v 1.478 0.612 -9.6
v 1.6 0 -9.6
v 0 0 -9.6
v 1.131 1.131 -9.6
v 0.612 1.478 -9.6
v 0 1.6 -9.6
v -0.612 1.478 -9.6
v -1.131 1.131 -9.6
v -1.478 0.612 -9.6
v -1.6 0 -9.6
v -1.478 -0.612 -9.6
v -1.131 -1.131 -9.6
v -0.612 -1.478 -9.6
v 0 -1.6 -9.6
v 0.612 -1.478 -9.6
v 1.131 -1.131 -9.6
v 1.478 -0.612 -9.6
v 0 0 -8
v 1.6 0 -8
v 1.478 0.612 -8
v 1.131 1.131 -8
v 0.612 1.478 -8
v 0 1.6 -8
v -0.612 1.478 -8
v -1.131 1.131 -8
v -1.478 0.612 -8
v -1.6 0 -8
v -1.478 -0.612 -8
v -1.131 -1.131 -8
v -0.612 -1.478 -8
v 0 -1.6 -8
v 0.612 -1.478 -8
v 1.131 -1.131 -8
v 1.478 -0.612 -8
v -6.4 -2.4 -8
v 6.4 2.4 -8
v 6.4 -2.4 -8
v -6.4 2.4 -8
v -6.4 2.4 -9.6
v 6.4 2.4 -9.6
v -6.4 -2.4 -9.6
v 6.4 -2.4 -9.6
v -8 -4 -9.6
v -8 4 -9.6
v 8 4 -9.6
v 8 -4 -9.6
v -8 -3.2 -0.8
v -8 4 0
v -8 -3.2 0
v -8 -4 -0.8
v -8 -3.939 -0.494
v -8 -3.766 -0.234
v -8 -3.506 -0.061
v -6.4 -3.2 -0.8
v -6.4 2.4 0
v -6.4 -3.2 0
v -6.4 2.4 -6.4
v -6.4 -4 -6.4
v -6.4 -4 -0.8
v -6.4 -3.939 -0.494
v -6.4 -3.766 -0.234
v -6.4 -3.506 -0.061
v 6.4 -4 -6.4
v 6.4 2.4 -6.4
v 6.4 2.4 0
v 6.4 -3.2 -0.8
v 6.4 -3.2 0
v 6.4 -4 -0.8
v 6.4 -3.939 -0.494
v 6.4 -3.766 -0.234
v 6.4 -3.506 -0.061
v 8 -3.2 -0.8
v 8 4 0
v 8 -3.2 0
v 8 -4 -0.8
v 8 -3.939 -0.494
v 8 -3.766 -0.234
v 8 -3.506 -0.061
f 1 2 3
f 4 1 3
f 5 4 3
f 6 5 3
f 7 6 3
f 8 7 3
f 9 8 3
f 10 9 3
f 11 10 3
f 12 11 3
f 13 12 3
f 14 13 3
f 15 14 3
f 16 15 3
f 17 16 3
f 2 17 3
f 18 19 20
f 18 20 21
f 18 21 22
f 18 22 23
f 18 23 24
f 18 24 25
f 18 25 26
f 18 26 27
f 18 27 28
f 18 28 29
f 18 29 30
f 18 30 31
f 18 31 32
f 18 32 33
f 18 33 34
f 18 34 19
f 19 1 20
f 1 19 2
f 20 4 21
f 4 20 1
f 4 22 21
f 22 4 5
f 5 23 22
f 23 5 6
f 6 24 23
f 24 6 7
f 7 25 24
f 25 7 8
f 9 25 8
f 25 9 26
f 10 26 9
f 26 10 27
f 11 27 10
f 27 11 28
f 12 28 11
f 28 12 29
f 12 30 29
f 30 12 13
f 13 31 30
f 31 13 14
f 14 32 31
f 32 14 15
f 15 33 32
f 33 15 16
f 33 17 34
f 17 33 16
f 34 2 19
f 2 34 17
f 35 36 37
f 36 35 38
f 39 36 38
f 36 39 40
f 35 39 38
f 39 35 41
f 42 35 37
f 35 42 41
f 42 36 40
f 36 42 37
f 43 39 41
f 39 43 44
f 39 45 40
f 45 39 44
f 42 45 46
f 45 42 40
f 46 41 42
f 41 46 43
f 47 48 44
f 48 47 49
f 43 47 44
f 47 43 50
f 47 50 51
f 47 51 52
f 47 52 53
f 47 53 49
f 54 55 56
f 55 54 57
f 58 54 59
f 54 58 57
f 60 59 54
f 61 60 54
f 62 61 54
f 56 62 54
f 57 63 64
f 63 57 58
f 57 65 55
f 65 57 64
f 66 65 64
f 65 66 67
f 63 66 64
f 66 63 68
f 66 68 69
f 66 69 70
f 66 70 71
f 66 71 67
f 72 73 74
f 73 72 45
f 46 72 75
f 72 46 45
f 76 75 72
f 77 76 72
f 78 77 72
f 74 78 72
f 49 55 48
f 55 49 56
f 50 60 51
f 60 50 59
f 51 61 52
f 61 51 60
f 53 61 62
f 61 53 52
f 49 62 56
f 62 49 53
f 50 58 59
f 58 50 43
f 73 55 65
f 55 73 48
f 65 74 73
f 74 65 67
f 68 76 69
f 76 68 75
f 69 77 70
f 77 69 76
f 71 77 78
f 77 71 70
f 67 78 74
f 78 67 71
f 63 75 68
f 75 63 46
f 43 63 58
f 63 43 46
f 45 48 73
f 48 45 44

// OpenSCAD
// file: ../p/4-4edge.scad
use <../lib.scad>
function ldraw_lib__4_4edge() = [
// 0 Circle 1.0
// 0 Name: 4-4edge.dat
// 0 Author: James Jessiman
// 0 !LDRAW_ORG Primitive UPDATE 2017-01
// 0 !LICENSE Licensed under CC BY 2.0 and CC BY 4.0 : see CAreadme.txt
// 
// 0 BFC CERTIFY CCW
  [0,"BFC","CERTIFY"],
  [0,"BFC","CCW"],
// 
// 0 !HISTORY 1998-12-15 [PTadmin] Official Update 1998-10
// 0 !HISTORY 2005-12-28 [PTadmin] Official Update 2005-01
// 0 !HISTORY 2007-06-24 [PTadmin] Header formatted for Contributor Agreement
// 0 !HISTORY 2008-07-01 [PTadmin] Official Update 2008-01
// 0 !HISTORY 2017-01-15 [Steffen] BFCed
// 0 !HISTORY 2017-12-30 [PTadmin] Official Update 2017-01
// 
// 
// 2 24 1 0 0 0.9239 0 0.3827
  [2,24,1,0,0,0.9239,0,0.3827],
// 2 24 0.9239 0 0.3827 0.7071 0 0.7071
  [2,24,0.9239,0,0.3827,0.7071,0,0.7071],
// 2 24 0.7071 0 0.7071 0.3827 0 0.9239
  [2,24,0.7071,0,0.7071,0.3827,0,0.9239],
// 2 24 0.3827 0 0.9239 0 0 1
  [2,24,0.3827,0,0.9239,0,0,1],
// 2 24 0 0 1 -0.3827 0 0.9239
  [2,24,0,0,1,-0.3827,0,0.9239],
// 2 24 -0.3827 0 0.9239 -0.7071 0 0.7071
  [2,24,-0.3827,0,0.9239,-0.7071,0,0.7071],
// 2 24 -0.7071 0 0.7071 -0.9239 0 0.3827
  [2,24,-0.7071,0,0.7071,-0.9239,0,0.3827],
// 2 24 -0.9239 0 0.3827 -1 0 -0
  [2,24,-0.9239,0,0.3827,-1,0,-0],
// 2 24 -1 0 -0 -0.9239 0 -0.3827
  [2,24,-1,0,-0,-0.9239,0,-0.3827],
// 2 24 -0.9239 0 -0.3827 -0.7071 0 -0.7071
  [2,24,-0.9239,0,-0.3827,-0.7071,0,-0.7071],
// 2 24 -0.7071 0 -0.7071 -0.3827 0 -0.9239
  [2,24,-0.7071,0,-0.7071,-0.3827,0,-0.9239],
// 2 24 -0.3827 0 -0.9239 0 0 -1
  [2,24,-0.3827,0,-0.9239,0,0,-1],
// 2 24 0 0 -1 0.3827 0 -0.9239
  [2,24,0,0,-1,0.3827,0,-0.9239],
// 2 24 0.3827 0 -0.9239 0.7071 0 -0.7071
  [2,24,0.3827,0,-0.9239,0.7071,0,-0.7071],
// 2 24 0.7071 0 -0.7071 0.9239 0 -0.3827
  [2,24,0.7071,0,-0.7071,0.9239,0,-0.3827],
// 2 24 0.9239 0 -0.3827 1 0 0
  [2,24,0.9239,0,-0.3827,1,0,0],
];
module ldraw_lib__4_4edge(step=0, col=false, unit=2/5, alt=false, line=0.2, solid=!$preview)
    makepoly(ldraw_lib__4_4edge(), step=step, col=col, unit=unit, alt=alt, line=line, solid=solid);
ldraw_lib__4_4edge(line=0.2);
// file: ../p/4-4disc.scad
use <../lib.scad>
function ldraw_lib__4_4disc() = [
// 0 Disc 1.0
// 0 Name: 4-4disc.dat
// 0 Author: James Jessiman
// 0 !LDRAW_ORG Primitive UPDATE 2002-02
// 0 !LICENSE Licensed under CC BY 2.0 and CC BY 4.0 : see CAreadme.txt
// 
// 0 BFC CERTIFY CCW
  [0,"BFC","CERTIFY"],
  [0,"BFC","CCW"],
// 
// 0 !HISTORY 1998-12-15 [PTadmin] Official Update 1998-10
// 0 !HISTORY 2002-03-23 [sbliss] Added BFC statement
// 0 !HISTORY 2002-04-25 [PTadmin] Official Update 2002-02
// 0 !HISTORY 2007-06-24 [PTadmin] Header formatted for Contributor Agreement
// 0 !HISTORY 2008-07-01 [PTadmin] Official Update 2008-01
// 
// 
// 3 16 0 0 0 1 0 0 0.9239 0 0.3827
  [3,16,0,0,0,1,0,0,0.9239,0,0.3827],
// 3 16 0 0 0 0.9239 0 0.3827 0.7071 0 0.7071
  [3,16,0,0,0,0.9239,0,0.3827,0.7071,0,0.7071],
// 3 16 0 0 0 0.7071 0 0.7071 0.3827 0 0.9239
  [3,16,0,0,0,0.7071,0,0.7071,0.3827,0,0.9239],
// 3 16 0 0 0 0.3827 0 0.9239 0 0 1
  [3,16,0,0,0,0.3827,0,0.9239,0,0,1],
// 3 16 0 0 0 0 0 1 -0.3827 0 0.9239
  [3,16,0,0,0,0,0,1,-0.3827,0,0.9239],
// 3 16 0 0 0 -0.3827 0 0.9239 -0.7071 0 0.7071
  [3,16,0,0,0,-0.3827,0,0.9239,-0.7071,0,0.7071],
// 3 16 0 0 0 -0.7071 0 0.7071 -0.9239 0 0.3827
  [3,16,0,0,0,-0.7071,0,0.7071,-0.9239,0,0.3827],
// 3 16 0 0 0 -0.9239 0 0.3827 -1 0 -0
  [3,16,0,0,0,-0.9239,0,0.3827,-1,0,-0],
// 3 16 0 0 0 -1 0 -0 -0.9239 0 -0.3827
  [3,16,0,0,0,-1,0,-0,-0.9239,0,-0.3827],
// 3 16 0 0 0 -0.9239 0 -0.3827 -0.7071 0 -0.7071
  [3,16,0,0,0,-0.9239,0,-0.3827,-0.7071,0,-0.7071],
// 3 16 0 0 0 -0.7071 0 -0.7071 -0.3827 0 -0.9239
  [3,16,0,0,0,-0.7071,0,-0.7071,-0.3827,0,-0.9239],
// 3 16 0 0 0 -0.3827 0 -0.9239 0 0 -1
  [3,16,0,0,0,-0.3827,0,-0.9239,0,0,-1],
// 3 16 0 0 0 0 0 -1 0.3827 0 -0.9239
  [3,16,0,0,0,0,0,-1,0.3827,0,-0.9239],
// 3 16 0 0 0 0.3827 0 -0.9239 0.7071 0 -0.7071
  [3,16,0,0,0,0.3827,0,-0.9239,0.7071,0,-0.7071],
// 3 16 0 0 0 0.7071 0 -0.7071 0.9239 0 -0.3827
  [3,16,0,0,0,0.7071,0,-0.7071,0.9239,0,-0.3827],
// 3 16 0 0 0 0.9239 0 -0.3827 1 0 0
  [3,16,0,0,0,0.9239,0,-0.3827,1,0,0],
// 0
];
module ldraw_lib__4_4disc(step=0, col=false, unit=2/5, alt=false, line=0.2, solid=!$preview)
    makepoly(ldraw_lib__4_4disc(), step=step, col=col, unit=unit, alt=alt, line=line, solid=solid);
ldraw_lib__4_4disc(line=0.2);
// file: ../p/4-4cyli.scad
use <../lib.scad>
function ldraw_lib__4_4cyli() = [
// 0 Cylinder 1.0
// 0 Name: 4-4cyli.dat
// 0 Author: James Jessiman
// 0 !LDRAW_ORG Primitive UPDATE 2005-01
// 0 !LICENSE Licensed under CC BY 4.0 : see CAreadme.txt
// 
// 0 BFC CERTIFY CCW
  [0,"BFC","CERTIFY"],
  [0,"BFC","CCW"],
// 
// 0 !HISTORY 1998-12-15 [PTadmin] Official Update 1998-10
// 0 !HISTORY 2002-03-23 [sbliss] Added BFC statement; merged headers from files in distributions LDraw 0.27 and Complete.
// 0 !HISTORY 2002-04-25 [PTadmin] Official Update 2002-02
// 0 !HISTORY 2004-12-14 [guyvivan] BFC CCW
// 0 !HISTORY 2005-12-28 [PTadmin] Official Update 2005-01
// 0 !HISTORY 2007-06-24 [PTadmin] Header formatted for Contributor Agreement
// 0 !HISTORY 2008-07-01 [PTadmin] Official Update 2008-01
// 
// 
// 4 16 1 1 0 0.9239 1 0.3827 0.9239 0 0.3827 1 0 0
  [4,16,1,1,0,0.9239,1,0.3827,0.9239,0,0.3827,1,0,0],
// 5 24 1 0 0 1 1 0 0.9239 0 0.3827 0.9239 0 -0.3827
  [5,24,1,0,0,1,1,0,0.9239,0,0.3827,0.9239,0,-0.3827],
// 4 16 0.9239 1 0.3827 0.7071 1 0.7071 0.7071 0 0.7071 0.9239 0 0.3827
  [4,16,0.9239,1,0.3827,0.7071,1,0.7071,0.7071,0,0.7071,0.9239,0,0.3827],
// 5 24 0.9239 0 0.3827 0.9239 1 0.3827 0.7071 0 0.7071 1 0 0
  [5,24,0.9239,0,0.3827,0.9239,1,0.3827,0.7071,0,0.7071,1,0,0],
// 4 16 0.7071 1 0.7071 0.3827 1 0.9239 0.3827 0 0.9239 0.7071 0 0.7071
  [4,16,0.7071,1,0.7071,0.3827,1,0.9239,0.3827,0,0.9239,0.7071,0,0.7071],
// 5 24 0.7071 0 0.7071 0.7071 1 0.7071 0.3827 0 0.9239 0.9239 0 0.3827
  [5,24,0.7071,0,0.7071,0.7071,1,0.7071,0.3827,0,0.9239,0.9239,0,0.3827],
// 4 16 0.3827 1 0.9239 0 1 1 0 0 1 0.3827 0 0.9239
  [4,16,0.3827,1,0.9239,0,1,1,0,0,1,0.3827,0,0.9239],
// 5 24 0.3827 0 0.9239 0.3827 1 0.9239 0 0 1 0.7071 0 0.7071
  [5,24,0.3827,0,0.9239,0.3827,1,0.9239,0,0,1,0.7071,0,0.7071],
// 4 16 0 1 1 -0.3827 1 0.9239 -0.3827 0 0.9239 0 0 1
  [4,16,0,1,1,-0.3827,1,0.9239,-0.3827,0,0.9239,0,0,1],
// 5 24 0 0 1 0 1 1 -0.3827 0 0.9239 0.3827 0 0.9239
  [5,24,0,0,1,0,1,1,-0.3827,0,0.9239,0.3827,0,0.9239],
// 4 16 -0.3827 1 0.9239 -0.7071 1 0.7071 -0.7071 0 0.7071 -0.3827 0 0.9239
  [4,16,-0.3827,1,0.9239,-0.7071,1,0.7071,-0.7071,0,0.7071,-0.3827,0,0.9239],
// 5 24 -0.3827 0 0.9239 -0.3827 1 0.9239 -0.7071 0 0.7071 0 0 1
  [5,24,-0.3827,0,0.9239,-0.3827,1,0.9239,-0.7071,0,0.7071,0,0,1],
// 4 16 -0.7071 1 0.7071 -0.9239 1 0.3827 -0.9239 0 0.3827 -0.7071 0 0.7071
  [4,16,-0.7071,1,0.7071,-0.9239,1,0.3827,-0.9239,0,0.3827,-0.7071,0,0.7071],
// 5 24 -0.7071 0 0.7071 -0.7071 1 0.7071 -0.9239 0 0.3827 -0.3827 0 0.9239
  [5,24,-0.7071,0,0.7071,-0.7071,1,0.7071,-0.9239,0,0.3827,-0.3827,0,0.9239],
// 4 16 -0.9239 1 0.3827 -1 1 0 -1 0 0 -0.9239 0 0.3827
  [4,16,-0.9239,1,0.3827,-1,1,0,-1,0,0,-0.9239,0,0.3827],
// 5 24 -0.9239 0 0.3827 -0.9239 1 0.3827 -1 0 0 -0.7071 0 0.7071
  [5,24,-0.9239,0,0.3827,-0.9239,1,0.3827,-1,0,0,-0.7071,0,0.7071],
// 4 16 -1 1 0 -0.9239 1 -0.3827 -0.9239 0 -0.3827 -1 0 0
  [4,16,-1,1,0,-0.9239,1,-0.3827,-0.9239,0,-0.3827,-1,0,0],
// 5 24 -1 0 0 -1 1 0 -0.9239 0 -0.3827 -0.9239 0 0.3827
  [5,24,-1,0,0,-1,1,0,-0.9239,0,-0.3827,-0.9239,0,0.3827],
// 4 16 -0.9239 1 -0.3827 -0.7071 1 -0.7071 -0.7071 0 -0.7071 -0.9239 0 -0.3827
  [4,16,-0.9239,1,-0.3827,-0.7071,1,-0.7071,-0.7071,0,-0.7071,-0.9239,0,-0.3827],
// 5 24 -0.9239 0 -0.3827 -0.9239 1 -0.3827 -0.7071 0 -0.7071 -1 0 0
  [5,24,-0.9239,0,-0.3827,-0.9239,1,-0.3827,-0.7071,0,-0.7071,-1,0,0],
// 4 16 -0.7071 1 -0.7071 -0.3827 1 -0.9239 -0.3827 0 -0.9239 -0.7071 0 -0.7071
  [4,16,-0.7071,1,-0.7071,-0.3827,1,-0.9239,-0.3827,0,-0.9239,-0.7071,0,-0.7071],
// 5 24 -0.7071 0 -0.7071 -0.7071 1 -0.7071 -0.3827 0 -0.9239 -0.9239 0 -0.3827
  [5,24,-0.7071,0,-0.7071,-0.7071,1,-0.7071,-0.3827,0,-0.9239,-0.9239,0,-0.3827],
// 4 16 -0.3827 1 -0.9239 0 1 -1 0 0 -1 -0.3827 0 -0.9239
  [4,16,-0.3827,1,-0.9239,0,1,-1,0,0,-1,-0.3827,0,-0.9239],
// 5 24 -0.3827 0 -0.9239 -0.3827 1 -0.9239 0 0 -1 -0.7071 0 -0.7071
  [5,24,-0.3827,0,-0.9239,-0.3827,1,-0.9239,0,0,-1,-0.7071,0,-0.7071],
// 4 16 0 1 -1 0.3827 1 -0.9239 0.3827 0 -0.9239 0 0 -1
  [4,16,0,1,-1,0.3827,1,-0.9239,0.3827,0,-0.9239,0,0,-1],
// 5 24 0 0 -1 0 1 -1 0.3827 0 -0.9239 -0.3827 0 -0.9239
  [5,24,0,0,-1,0,1,-1,0.3827,0,-0.9239,-0.3827,0,-0.9239],
// 4 16 0.3827 1 -0.9239 0.7071 1 -0.7071 0.7071 0 -0.7071 0.3827 0 -0.9239
  [4,16,0.3827,1,-0.9239,0.7071,1,-0.7071,0.7071,0,-0.7071,0.3827,0,-0.9239],
// 5 24 0.3827 0 -0.9239 0.3827 1 -0.9239 0.7071 0 -0.7071 0 0 -1
  [5,24,0.3827,0,-0.9239,0.3827,1,-0.9239,0.7071,0,-0.7071,0,0,-1],
// 4 16 0.7071 1 -0.7071 0.9239 1 -0.3827 0.9239 0 -0.3827 0.7071 0 -0.7071
  [4,16,0.7071,1,-0.7071,0.9239,1,-0.3827,0.9239,0,-0.3827,0.7071,0,-0.7071],
// 5 24 0.7071 0 -0.7071 0.7071 1 -0.7071 0.9239 0 -0.3827 0.3827 0 -0.9239
  [5,24,0.7071,0,-0.7071,0.7071,1,-0.7071,0.9239,0,-0.3827,0.3827,0,-0.9239],
// 4 16 0.9239 1 -0.3827 1 1 0 1 0 0 0.9239 0 -0.3827
  [4,16,0.9239,1,-0.3827,1,1,0,1,0,0,0.9239,0,-0.3827],
// 5 24 0.9239 0 -0.3827 0.9239 1 -0.3827 1 0 0 0.7071 0 -0.7071
  [5,24,0.9239,0,-0.3827,0.9239,1,-0.3827,1,0,0,0.7071,0,-0.7071],
// 0
];
module ldraw_lib__4_4cyli(step=0, col=false, unit=2/5, alt=false, line=0.2, solid=!$preview)
    makepoly(ldraw_lib__4_4cyli(), step=step, col=col, unit=unit, alt=alt, line=line, solid=solid);
ldraw_lib__4_4cyli(line=0.2);
// file: ../p/1-4edge.scad
use <../lib.scad>
$fa=1; $fs=0.2;
function ldraw_lib__1_4edge(realsolid=false) = [
// 0 Circle 0.25
// 0 Name: 1-4edge.dat
// 0 Author: James Jessiman
// 0 !LDRAW_ORG Primitive UPDATE 2017-01
// 0 !LICENSE Licensed under CC BY 2.0 and CC BY 4.0 : see CAreadme.txt
// 
// 0 BFC CERTIFY CCW
  [0,"BFC","CERTIFY"],
  [0,"BFC","CCW"],
// 
// 0 !HISTORY 2007-06-22 [PTadmin] Header formatted for Contributor Agreement
// 0 !HISTORY 2008-07-01 [PTadmin] Official Update 2008-01
// 0 !HISTORY 2017-01-15 [Steffen] BFCed
// 0 !HISTORY 2017-12-30 [PTadmin] Official Update 2017-01
// 
// 
// 2 24 1 0 0 0.9239 0 0.3827
  [2,24,1,0,0,0.9239,0,0.3827],
// 2 24 0.9239 0 0.3827 0.7071 0 0.7071
  [2,24,0.9239,0,0.3827,0.7071,0,0.7071],
// 2 24 0.7071 0 0.7071 0.3827 0 0.9239
  [2,24,0.7071,0,0.7071,0.3827,0,0.9239],
// 2 24 0.3827 0 0.9239 0 0 1
  [2,24,0.3827,0,0.9239,0,0,1],
];
module ldraw_lib__1_4edge(step=0, col=false, unit=2/5, alt=false, line=0.2, solid=!$preview)
    makepoly(ldraw_lib__1_4edge(solid), step=step, col=col, unit=unit, alt=alt, line=line, solid=solid);
ldraw_lib__1_4edge(line=0.2);
// file: ../p/1-4cyli.scad
use <../lib.scad>
function ldraw_lib__1_4cyli() = [
// 0 Cylinder 0.25
// 0 Name: 1-4cyli.dat
// 0 Author: James Jessiman
// 0 !LDRAW_ORG Primitive UPDATE 2012-01
// 0 !LICENSE Licensed under CC BY 2.0 and CC BY 4.0 : see CAreadme.txt
// 
// 0 BFC CERTIFY CCW
  [0,"BFC","CERTIFY"],
  [0,"BFC","CCW"],
// 
// 0 !HISTORY 2002-03-23 [sbliss] Added BFC statement.
// 0 !HISTORY 2002-04-25 [PTadmin] Official Update 2002-02
// 0 !HISTORY 2007-06-22 [PTadmin] Header formatted for Contributor Agreement
// 0 !HISTORY 2008-07-01 [PTadmin] Official Update 2008-01
// 0 !HISTORY 2012-02-16 [Philo] Changed to CCW
// 0 !HISTORY 2012-03-30 [PTadmin] Official Update 2012-01
// 
// 
// 4 16 1 1 0 0.9239 1 0.3827 0.9239 0 0.3827 1 0 0
  [4,16,1,1,0,0.9239,1,0.3827,0.9239,0,0.3827,1,0,0],
// 5 24 1 0 0 1 1 0 0.9239 0 0.3827 1 0 -1
  [5,24,1,0,0,1,1,0,0.9239,0,0.3827,1,0,-1],
// 4 16 0.9239 1 0.3827 0.7071 1 0.7071 0.7071 0 0.7071 0.9239 0 0.3827
  [4,16,0.9239,1,0.3827,0.7071,1,0.7071,0.7071,0,0.7071,0.9239,0,0.3827],
// 5 24 0.9239 0 0.3827 0.9239 1 0.3827 0.7071 0 0.7071 1 0 0
  [5,24,0.9239,0,0.3827,0.9239,1,0.3827,0.7071,0,0.7071,1,0,0],
// 4 16 0.7071 1 0.7071 0.3827 1 0.9239 0.3827 0 0.9239 0.7071 0 0.7071
  [4,16,0.7071,1,0.7071,0.3827,1,0.9239,0.3827,0,0.9239,0.7071,0,0.7071],
// 5 24 0.7071 0 0.7071 0.7071 1 0.7071 0.3827 0 0.9239 0.9239 0 0.3827
  [5,24,0.7071,0,0.7071,0.7071,1,0.7071,0.3827,0,0.9239,0.9239,0,0.3827],
// 4 16 0.3827 1 0.9239 0 1 1 0 0 1 0.3827 0 0.9239
  [4,16,0.3827,1,0.9239,0,1,1,0,0,1,0.3827,0,0.9239],
// 5 24 0.3827 0 0.9239 0.3827 1 0.9239 0 0 1 0.7071 0 0.7071
  [5,24,0.3827,0,0.9239,0.3827,1,0.9239,0,0,1,0.7071,0,0.7071],
// 5 24 0 0 1 0 1 1 0.3827 0 0.9239 -1 0 1
  [5,24,0,0,1,0,1,1,0.3827,0,0.9239,-1,0,1],
];
module ldraw_lib__1_4cyli(step=0, col=false, unit=2/5, alt=false, line=0.2, solid=!$preview)
    makepoly(ldraw_lib__1_4cyli(), step=step, col=col, unit=unit, alt=alt, line=line, solid=solid);
ldraw_lib__1_4cyli(line=0.2);
// file: ../p/stud3.scad
use <../lib.scad>
use <4-4cyli.scad>
use <4-4disc.scad>
use <4-4edge.scad>
function ldraw_lib__stud3() = [
// 0 Stud Tube Solid
// 0 Name: stud3.dat
// 0 Author: James Jessiman
// 0 !LDRAW_ORG Primitive UPDATE 2012-01
// 0 !LICENSE Licensed under CC BY 4.0 : see CAreadme.txt
// 
// 0 BFC CERTIFY CCW
  [0,"BFC","CERTIFY"],
  [0,"BFC","CCW"],
// 
// 0 !HISTORY 2002-04-04 [sbliss] Modified for BFC compliance
// 0 !HISTORY 2002-04-25 [PTadmin] Official Update 2002-02
// 0 !HISTORY 2007-06-24 [PTadmin] Header formatted for Contributor Agreement
// 0 !HISTORY 2008-07-01 [PTadmin] Official Update 2008-01
// 0 !HISTORY 2012-02-16 [Philo] Changed to CCW
// 0 !HISTORY 2012-03-30 [PTadmin] Official Update 2012-01
// 
// 
// 1 16 0 -4 0 4 0 0 0 1 0 0 0 4 4-4edge.dat
  [1,16,0,-4,0,4,0,0,0,1,0,0,0,4, ldraw_lib__4_4edge()],
// 1 16 0 0 0 4 0 0 0 1 0 0 0 4 4-4edge.dat
  [1,16,0,0,0,4,0,0,0,1,0,0,0,4, ldraw_lib__4_4edge()],
// 1 16 0 -4 0 4 0 0 0 1 0 0 0 4 4-4disc.dat
  [1,16,0,-4,0,4,0,0,0,1,0,0,0,4, ldraw_lib__4_4disc()],
  [-1,16,0,0,0,4,0,0,0,-1,0,0,0,4, ldraw_lib__4_4disc()],
// 1 16 0 -4 0 4 0 0 0 4 0 0 0 4 4-4cyli.dat
  [1,16,0,-4,0,4,0,0,0,4,0,0,0,4, ldraw_lib__4_4cyli()],
];
module ldraw_lib__stud3(step=0, col=false, unit=2/5, alt=false, line=0.2, solid=!$preview)
    makepoly(ldraw_lib__stud3(), step=step, col=col, unit=unit, alt=alt, line=line, solid=solid);
ldraw_lib__stud3(line=0.2);
// file: ../p/recte3.scad
use <../lib.scad>
$fa=1; $fs=0.2;
function ldraw_lib__recte3(realsolid=false) = [
// 0 Rectangle Empty with 3 Edges
// 0 Name: recte3.dat
// 0 Author: Steffen [Steffen]
// 0 !LDRAW_ORG Primitive UPDATE 2011-01
// 0 !LICENSE Licensed under CC BY 2.0 and CC BY 4.0 : see CAreadme.txt
// 
// 0 BFC CERTIFY CCW
  [0,"BFC","CERTIFY"],
  [0,"BFC","CCW"],
// 
// 0 !HISTORY 2011-07-25 [PTadmin] Official Update 2011-01
// 
// 
// 2 24 1 0 1 -1 0 1
  [2,24,1,0,1,-1,0,1],
// 2 24 -1 0 1 -1 0 -1
  [2,24,-1,0,1,-1,0,-1],
// 2 24 1 0 -1 1 0 1
  [2,24,1,0,-1,1,0,1],
];
module ldraw_lib__recte3(step=0, col=false, unit=2/5, alt=false, line=0.2, solid=!$preview)
    makepoly(ldraw_lib__recte3(solid), step=step, col=col, unit=unit, alt=alt, line=line, solid=solid);
ldraw_lib__recte3(line=0.2);
// file: ../p/box5.scad
use <../lib.scad>
function ldraw_lib__box5() = [
// 0 Box with 5 Faces and All Edges
// 0 Name: box5.dat
// 0 Author: James Jessiman
// 0 !LDRAW_ORG Primitive UPDATE 2012-01
// 0 !LICENSE Licensed under CC BY 2.0 and CC BY 4.0 : see CAreadme.txt
// 
// 0 BFC CERTIFY CCW
  [0,"BFC","CERTIFY"],
  [0,"BFC","CCW"],
// 
// 0 !HISTORY 2002-04-03 [sbliss] Modified for BFC compliance
// 0 !HISTORY 2002-04-25 [PTadmin] Official Update 2002-02
// 0 !HISTORY 2007-06-24 [PTadmin] Header formatted for Contributor Agreement
// 0 !HISTORY 2008-07-01 [PTadmin] Official Update 2008-01
// 0 !HISTORY 2012-02-16 [Philo] Changed to CCW
// 0 !HISTORY 2012-03-30 [PTadmin] Official Update 2012-01
// 
// 
// 2 24 1 1 1 -1 1 1
  [2,24,1,1,1,-1,1,1],
// 2 24 -1 1 1 -1 1 -1
  [2,24,-1,1,1,-1,1,-1],
// 2 24 -1 1 -1 1 1 -1
  [2,24,-1,1,-1,1,1,-1],
// 2 24 1 1 -1 1 1 1
  [2,24,1,1,-1,1,1,1],
// 2 24 1 0 1 -1 0 1
  [2,24,1,0,1,-1,0,1],
// 2 24 -1 0 1 -1 0 -1
  [2,24,-1,0,1,-1,0,-1],
// 2 24 -1 0 -1 1 0 -1
  [2,24,-1,0,-1,1,0,-1],
// 2 24 1 0 -1 1 0 1
  [2,24,1,0,-1,1,0,1],
// 2 24 1 0 1 1 1 1
  [2,24,1,0,1,1,1,1],
// 2 24 -1 0 1 -1 1 1
  [2,24,-1,0,1,-1,1,1],
// 2 24 1 0 -1 1 1 -1
  [2,24,1,0,-1,1,1,-1],
// 2 24 -1 0 -1 -1 1 -1
  [2,24,-1,0,-1,-1,1,-1],
// 4 16 -1 1 1 1 1 1 1 1 -1 -1 1 -1
  [4,16,-1,1,1,1,1,1,1,1,-1,-1,1,-1],
// 4 16 -1 1 1 -1 0 1 1 0 1 1 1 1
  [4,16,-1,1,1,-1,0,1,1,0,1,1,1,1],
// 4 16 -1 1 -1 -1 0 -1 -1 0 1 -1 1 1
  [4,16,-1,1,-1,-1,0,-1,-1,0,1,-1,1,1],
// 4 16 1 1 -1 1 0 -1 -1 0 -1 -1 1 -1
  [4,16,1,1,-1,1,0,-1,-1,0,-1,-1,1,-1],
// 4 16 1 1 1 1 0 1 1 0 -1 1 1 -1
  [4,16,1,1,1,1,0,1,1,0,-1,1,1,-1],
];
makepoly(ldraw_lib__box5(), line=0.2);
// file: ../p/box2-7.scad
use <../lib.scad>
function ldraw_lib__box2_7() = [
// 0 Box with  2 Faces without  7 Edges
// 0 Name: box2-7.dat
// 0 Author: Willy Tschager [Holly-Wood]
// 0 !LDRAW_ORG Primitive UPDATE 2024-01
// 0 !LICENSE Licensed under CC BY 4.0 : see CAreadme.txt
// 
// 0 BFC CERTIFY CCW
  [0,"BFC","CERTIFY"],
  [0,"BFC","CCW"],
// 
// 0 !HISTORY 2009-05-02 [PTadmin] Official Update 2009-01
// 0 !HISTORY 2024-01-02 [Holly-Wood] Complete re-write, original by guyvivan
// 0 !HISTORY 2024-01-29 [OrionP] Official Update 2024-01
// 
// 2 24 -1 1 -1 -1 1 1
  [2,24,-1,1,-1,-1,1,1],
// 2 24 1 1 1 1 1 -1
  [2,24,1,1,1,1,1,-1],
// 4 16 -1 1 1 1 1 1 1 1 -1 -1 1 -1
  [4,16,-1,1,1,1,1,1,1,1,-1,-1,1,-1],
// 
// 2 24 -1 1 1 -1 -1 1
  [2,24,-1,1,1,-1,-1,1],
// 2 24 1 1 1 1 -1 1
  [2,24,1,1,1,1,-1,1],
// 4 16 1 -1 1 1 1 1 -1 1 1 -1 -1 1
  [4,16,1,-1,1,1,1,1,-1,1,1,-1,-1,1],
// 
// 2 24 -1 1 1 1 1 1
  [2,24,-1,1,1,1,1,1],
];
module ldraw_lib__box2_7(step=0, col=false, unit=2/5, alt=false, line=0.2, solid=!$preview)
    makepoly(ldraw_lib__box2_7(), step=step, col=col, unit=unit, alt=alt, line=line, solid=solid);
ldraw_lib__box2_7(line=0.2);
// file: ../p/1-4disc.scad
use <../lib.scad>
function ldraw_lib__1_4disc() = [
// 0 Disc 0.25
// 0 Name: 1-4disc.dat
// 0 Author: James Jessiman
// 0 !LDRAW_ORG Primitive UPDATE 2002-02
// 0 !LICENSE Licensed under CC BY 2.0 and CC BY 4.0 : see CAreadme.txt
// 
// 0 BFC CERTIFY CCW
  [0,"BFC","CERTIFY"],
  [0,"BFC","CCW"],
// 
// 0 !HISTORY 2002-03-23 [sbliss] Added BFC statement.
// 0 !HISTORY 2002-04-25 [PTadmin] Official Update 2002-02
// 0 !HISTORY 2007-06-22 [PTadmin] Header formatted for Contributor Agreement
// 0 !HISTORY 2008-07-01 [PTadmin] Official Update 2008-01
// 
// 
// 3 16 0 0 0 1 0 0 0.9239 0 0.3827
  [3,16,0,0,0,1,0,0,0.9239,0,0.3827],
// 3 16 0 0 0 0.9239 0 0.3827 0.7071 0 0.7071
  [3,16,0,0,0,0.9239,0,0.3827,0.7071,0,0.7071],
// 3 16 0 0 0 0.7071 0 0.7071 0.3827 0 0.9239
  [3,16,0,0,0,0.7071,0,0.7071,0.3827,0,0.9239],
// 3 16 0 0 0 0.3827 0 0.9239 0 0 1
  [3,16,0,0,0,0.3827,0,0.9239,0,0,1],
// 0
];
makepoly(ldraw_lib__1_4disc(), line=0.2);
// file: ../p/1-4cylo.scad
use <../lib.scad>
use <1-4cyli.scad>
use <1-4edge.scad>
$fa=1; $fs=0.2;
function ldraw_lib__1_4cylo(realsolid=false) = [
// 0 Cylinder Open 0.25
// 0 Name: 1-4cylo.dat
// 0 Author: Max Martin Richter [MMR1988]
// 0 !LDRAW_ORG Primitive UPDATE 2010-03
// 0 !LICENSE Licensed under CC BY 2.0 and CC BY 4.0 : see CAreadme.txt
// 
// 0 BFC CERTIFY CCW
  [0,"BFC","CERTIFY"],
  [0,"BFC","CCW"],
// 
// 0 !HISTORY 2010-12-31 [PTadmin] Official Update 2010-03
// 
// 
// 1 16 0 0 0 1 0 0 0 1 0 0 0 1 1-4edge.dat
  [1,16,0,0,0,1,0,0,0,1,0,0,0,1, ldraw_lib__1_4edge(realsolid)],
// 1 16 0 1 0 1 0 0 0 1 0 0 0 1 1-4edge.dat
  [1,16,0,1,0,1,0,0,0,1,0,0,0,1, ldraw_lib__1_4edge(realsolid)],
// 1 16 0 0 0 1 0 0 0 1 0 0 0 1 1-4cyli.dat
  [1,16,0,0,0,1,0,0,0,1,0,0,0,1, ldraw_lib__1_4cyli(realsolid)],
];
module ldraw_lib__1_4cylo(step=0, col=false, unit=2/5, alt=false, line=0.2, solid=!$preview)
    makepoly(ldraw_lib__1_4cylo(solid), step=step, col=col, unit=unit, alt=alt, line=line, solid=solid);
ldraw_lib__1_4cylo(line=0.2);
// file: s/23969s01.scad
use <../../lib.scad>
use <../../p/1-4cylo.scad>
use <../../p/1-4disc.scad>
use <../../p/box2-7.scad>
use <../../p/box5.scad>
use <../../p/recte3.scad>
use <../../p/stud3.scad>
function ldraw_lib__s__23969s01() = [
// 0 ~Panel  1 x  2  x 1 Double Corner with Rounded Corners without Back Face
// 0 Name: s\23969s01.dat
// 0 Author: Orion Pobursky [OrionP]
// 0 !LDRAW_ORG Subpart UPDATE 2020-01
// 0 !LICENSE Licensed under CC BY 4.0 : see CAreadme.txt
// 
// 0 BFC CERTIFY CCW
  [0,"BFC","CERTIFY"],
  [0,"BFC","CCW"],
// 
// 0 !HISTORY 2020-06-28 [PTadmin] Official Update 2020-01
// 
// 
// 1 16 0 20 0 1 0 0 0 -1 0 0 0 1 stud3.dat
  [1,16,0,20,0,1,0,0,0,-1,0,0,0,1, ldraw_lib__stud3()],
// 0 BFC INVERTNEXT
  [0,"BFC","INVERTNEXT"],
// 1 16 0 24 0 16 0 0 0 -4 0 0 0 6 box5.dat
  [1,16,0,24,0,16,0,0,0,-4,0,0,0,6, ldraw_lib__box5()],
// 4 16 -20 24 -10 -20 24 10 -16 24 6 -16 24 -6
  [4,16,-20,24,-10,-20,24,10,-16,24,6,-16,24,-6],
// 4 16 -20 24 10 20 24 10 16 24 6 -16 24 6
  [4,16,-20,24,10,20,24,10,16,24,6,-16,24,6],
// 4 16 20 24 10 20 24 -10 16 24 -6 16 24 6
  [4,16,20,24,10,20,24,-10,16,24,-6,16,24,6],
// 4 16 20 24 -10 -20 24 -10 -16 24 -6 16 24 -6
  [4,16,20,24,-10,-20,24,-10,-16,24,-6,16,24,-6],
// 2 24 20 0 10 20 24 10
  [2,24,20,0,10,20,24,10],
// 2 24 -20 24 10 -20 0 10
  [2,24,-20,24,10,-20,0,10],
// 1 16 0 24 0 20 0 0 0 1 0 0 0 10 recte3.dat
  [1,16,0,24,0,20,0,0,0,1,0,0,0,10, ldraw_lib__recte3()],
// 4 16 -20 24 10 -20 2 -8 -20 0 -8 -20 0 10
  [4,16,-20,24,10,-20,2,-8,-20,0,-8,-20,0,10],
// 4 16 -20 24 10 -20 24 -10 -20 2 -10 -20 2 -8
  [4,16,-20,24,10,-20,24,-10,-20,2,-10,-20,2,-8],
// 1 16 -20 2 -8 0 1 0 0 0 -2 -2 0 0 1-4disc.dat
  [1,16,-20,2,-8,0,1,0,0,0,-2,-2,0,0, ldraw_lib__1_4disc()],
// 4 16 -16 0 6 -16 0 -8 -16 2 -8 -16 16 6
  [4,16,-16,0,6,-16,0,-8,-16,2,-8,-16,16,6],
// 4 16 -16 2 -8 -16 2 -10 -16 16 -10 -16 16 6
  [4,16,-16,2,-8,-16,2,-10,-16,16,-10,-16,16,6],
// 1 16 -16 2 -8 0 -1 0 0 0 -2 -2 0 0 1-4disc.dat
  [1,16,-16,2,-8,0,-1,0,0,0,-2,-2,0,0, ldraw_lib__1_4disc()],
// 0 BFC INVERTNEXT
  [0,"BFC","INVERTNEXT"],
// 1 16 0 8 -2 16 0 0 0 8 0 0 0 8 box2-7.dat
  [1,16,0,8,-2,16,0,0,0,8,0,0,0,8, ldraw_lib__box2_7()],
// 4 16 16 16 6 16 2 -8 16 0 -8 16 0 6
  [4,16,16,16,6,16,2,-8,16,0,-8,16,0,6],
// 4 16 16 16 6 16 16 -10 16 2 -10 16 2 -8
  [4,16,16,16,6,16,16,-10,16,2,-10,16,2,-8],
// 1 16 16 2 -8 0 1 0 0 0 -2 -2 0 0 1-4disc.dat
  [1,16,16,2,-8,0,1,0,0,0,-2,-2,0,0, ldraw_lib__1_4disc()],
// 4 16 20 0 10 20 0 -8 20 2 -8 20 24 10
  [4,16,20,0,10,20,0,-8,20,2,-8,20,24,10],
// 4 16 20 2 -8 20 2 -10 20 24 -10 20 24 10
  [4,16,20,2,-8,20,2,-10,20,24,-10,20,24,10],
// 1 16 20 2 -8 0 -1 0 0 0 -2 -2 0 0 1-4disc.dat
  [1,16,20,2,-8,0,-1,0,0,0,-2,-2,0,0, ldraw_lib__1_4disc()],
// 1 16 0 0 1 20 0 0 0 1 0 0 0 9 recte3.dat
  [1,16,0,0,1,20,0,0,0,1,0,0,0,9, ldraw_lib__recte3()],
// 1 16 0 0 -1 16 0 0 0 1 0 0 0 7 recte3.dat
  [1,16,0,0,-1,16,0,0,0,1,0,0,0,7, ldraw_lib__recte3()],
// 1 16 0 9 -10 16 0 0 0 0 7 0 -1 0 recte3.dat
  [1,16,0,9,-10,16,0,0,0,0,7,0,-1,0, ldraw_lib__recte3()],
// 1 16 0 13 -10 20 0 0 0 0 11 0 -1 0 recte3.dat
  [1,16,0,13,-10,20,0,0,0,0,11,0,-1,0, ldraw_lib__recte3()],
// 4 16 -20 0 -8 -16 0 -8 -16 0 6 -20 0 10
  [4,16,-20,0,-8,-16,0,-8,-16,0,6,-20,0,10],
// 1 16 -20 2 -8 0 4 0 0 0 -2 -2 0 0 1-4cylo.dat
  [1,16,-20,2,-8,0,4,0,0,0,-2,-2,0,0, ldraw_lib__1_4cylo()],
// 4 16 -20 24 -10 -16 16 -10 -16 2 -10 -20 2 -10
  [4,16,-20,24,-10,-16,16,-10,-16,2,-10,-20,2,-10],
// 4 16 -20 0 10 -16 0 6 16 0 6 20 0 10
  [4,16,-20,0,10,-16,0,6,16,0,6,20,0,10],
// 4 16 20 0 10 16 0 6 16 0 -8 20 0 -8
  [4,16,20,0,10,16,0,6,16,0,-8,20,0,-8],
// 1 16 16 2 -8 0 4 0 0 0 -2 -2 0 0 1-4cylo.dat
  [1,16,16,2,-8,0,4,0,0,0,-2,-2,0,0, ldraw_lib__1_4cylo()],
// 4 16 20 2 -10 16 2 -10 16 16 -10 20 24 -10
  [4,16,20,2,-10,16,2,-10,16,16,-10,20,24,-10],
// 4 16 -20 24 -10 20 24 -10 16 16 -10 -16 16 -10
  [4,16,-20,24,-10,20,24,-10,16,16,-10,-16,16,-10],
];
module ldraw_lib__s__23969s01(step=0, col=false, unit=2/5, alt=false, line=0.2, solid=!$preview)
    makepoly(ldraw_lib__s__23969s01(), step=step, col=col, unit=unit, alt=alt, line=line, solid=solid);
ldraw_lib__s__23969s01(line=0.2);
// main file
use <../lib.scad>
use <s/23969s01.scad>
function ldraw_lib__23969() = [
// 0 Panel  1 x  2 x  1 Double Corner with Rounded Corners
// 0 Name: 23969.dat
// 0 Author: Owen Burgoyne [C3POwen]
// 0 !LDRAW_ORG Part UPDATE 2020-01
// 0 !LICENSE Licensed under CC BY 4.0 : see CAreadme.txt
// 
// 0 BFC CERTIFY CCW
  [0,"BFC","CERTIFY"],
  [0,"BFC","CCW"],
// 
// 0 !HISTORY 2016-12-31 [PTadmin] Official Update 2016-01
// 0 !HISTORY 2020-02-16 [OrionP] Made use of subfile
// 0 !HISTORY 2020-06-28 [PTadmin] Official Update 2020-01
// 
// 
// 1 16 0 0 0 1 0 0 0 1 0 0 0 1 s\23969s01.dat
  [1,16,0,0,0,1,0,0,0,1,0,0,0,1, ldraw_lib__s__23969s01()],
// 4 16 20 24 10 -20 24 10 -20 0 10 20 0 10
  [4,16,20,24,10,-20,24,10,-20,0,10,20,0,10],
];
module ldraw_lib__23969(step=0, col=false, unit=2/5, alt=false, line=0.2, solid=!$preview)
    makepoly(ldraw_lib__23969(), step=step, col=col, unit=unit, alt=alt, line=line, solid=solid);
ldraw_lib__23969(line=0.2);
